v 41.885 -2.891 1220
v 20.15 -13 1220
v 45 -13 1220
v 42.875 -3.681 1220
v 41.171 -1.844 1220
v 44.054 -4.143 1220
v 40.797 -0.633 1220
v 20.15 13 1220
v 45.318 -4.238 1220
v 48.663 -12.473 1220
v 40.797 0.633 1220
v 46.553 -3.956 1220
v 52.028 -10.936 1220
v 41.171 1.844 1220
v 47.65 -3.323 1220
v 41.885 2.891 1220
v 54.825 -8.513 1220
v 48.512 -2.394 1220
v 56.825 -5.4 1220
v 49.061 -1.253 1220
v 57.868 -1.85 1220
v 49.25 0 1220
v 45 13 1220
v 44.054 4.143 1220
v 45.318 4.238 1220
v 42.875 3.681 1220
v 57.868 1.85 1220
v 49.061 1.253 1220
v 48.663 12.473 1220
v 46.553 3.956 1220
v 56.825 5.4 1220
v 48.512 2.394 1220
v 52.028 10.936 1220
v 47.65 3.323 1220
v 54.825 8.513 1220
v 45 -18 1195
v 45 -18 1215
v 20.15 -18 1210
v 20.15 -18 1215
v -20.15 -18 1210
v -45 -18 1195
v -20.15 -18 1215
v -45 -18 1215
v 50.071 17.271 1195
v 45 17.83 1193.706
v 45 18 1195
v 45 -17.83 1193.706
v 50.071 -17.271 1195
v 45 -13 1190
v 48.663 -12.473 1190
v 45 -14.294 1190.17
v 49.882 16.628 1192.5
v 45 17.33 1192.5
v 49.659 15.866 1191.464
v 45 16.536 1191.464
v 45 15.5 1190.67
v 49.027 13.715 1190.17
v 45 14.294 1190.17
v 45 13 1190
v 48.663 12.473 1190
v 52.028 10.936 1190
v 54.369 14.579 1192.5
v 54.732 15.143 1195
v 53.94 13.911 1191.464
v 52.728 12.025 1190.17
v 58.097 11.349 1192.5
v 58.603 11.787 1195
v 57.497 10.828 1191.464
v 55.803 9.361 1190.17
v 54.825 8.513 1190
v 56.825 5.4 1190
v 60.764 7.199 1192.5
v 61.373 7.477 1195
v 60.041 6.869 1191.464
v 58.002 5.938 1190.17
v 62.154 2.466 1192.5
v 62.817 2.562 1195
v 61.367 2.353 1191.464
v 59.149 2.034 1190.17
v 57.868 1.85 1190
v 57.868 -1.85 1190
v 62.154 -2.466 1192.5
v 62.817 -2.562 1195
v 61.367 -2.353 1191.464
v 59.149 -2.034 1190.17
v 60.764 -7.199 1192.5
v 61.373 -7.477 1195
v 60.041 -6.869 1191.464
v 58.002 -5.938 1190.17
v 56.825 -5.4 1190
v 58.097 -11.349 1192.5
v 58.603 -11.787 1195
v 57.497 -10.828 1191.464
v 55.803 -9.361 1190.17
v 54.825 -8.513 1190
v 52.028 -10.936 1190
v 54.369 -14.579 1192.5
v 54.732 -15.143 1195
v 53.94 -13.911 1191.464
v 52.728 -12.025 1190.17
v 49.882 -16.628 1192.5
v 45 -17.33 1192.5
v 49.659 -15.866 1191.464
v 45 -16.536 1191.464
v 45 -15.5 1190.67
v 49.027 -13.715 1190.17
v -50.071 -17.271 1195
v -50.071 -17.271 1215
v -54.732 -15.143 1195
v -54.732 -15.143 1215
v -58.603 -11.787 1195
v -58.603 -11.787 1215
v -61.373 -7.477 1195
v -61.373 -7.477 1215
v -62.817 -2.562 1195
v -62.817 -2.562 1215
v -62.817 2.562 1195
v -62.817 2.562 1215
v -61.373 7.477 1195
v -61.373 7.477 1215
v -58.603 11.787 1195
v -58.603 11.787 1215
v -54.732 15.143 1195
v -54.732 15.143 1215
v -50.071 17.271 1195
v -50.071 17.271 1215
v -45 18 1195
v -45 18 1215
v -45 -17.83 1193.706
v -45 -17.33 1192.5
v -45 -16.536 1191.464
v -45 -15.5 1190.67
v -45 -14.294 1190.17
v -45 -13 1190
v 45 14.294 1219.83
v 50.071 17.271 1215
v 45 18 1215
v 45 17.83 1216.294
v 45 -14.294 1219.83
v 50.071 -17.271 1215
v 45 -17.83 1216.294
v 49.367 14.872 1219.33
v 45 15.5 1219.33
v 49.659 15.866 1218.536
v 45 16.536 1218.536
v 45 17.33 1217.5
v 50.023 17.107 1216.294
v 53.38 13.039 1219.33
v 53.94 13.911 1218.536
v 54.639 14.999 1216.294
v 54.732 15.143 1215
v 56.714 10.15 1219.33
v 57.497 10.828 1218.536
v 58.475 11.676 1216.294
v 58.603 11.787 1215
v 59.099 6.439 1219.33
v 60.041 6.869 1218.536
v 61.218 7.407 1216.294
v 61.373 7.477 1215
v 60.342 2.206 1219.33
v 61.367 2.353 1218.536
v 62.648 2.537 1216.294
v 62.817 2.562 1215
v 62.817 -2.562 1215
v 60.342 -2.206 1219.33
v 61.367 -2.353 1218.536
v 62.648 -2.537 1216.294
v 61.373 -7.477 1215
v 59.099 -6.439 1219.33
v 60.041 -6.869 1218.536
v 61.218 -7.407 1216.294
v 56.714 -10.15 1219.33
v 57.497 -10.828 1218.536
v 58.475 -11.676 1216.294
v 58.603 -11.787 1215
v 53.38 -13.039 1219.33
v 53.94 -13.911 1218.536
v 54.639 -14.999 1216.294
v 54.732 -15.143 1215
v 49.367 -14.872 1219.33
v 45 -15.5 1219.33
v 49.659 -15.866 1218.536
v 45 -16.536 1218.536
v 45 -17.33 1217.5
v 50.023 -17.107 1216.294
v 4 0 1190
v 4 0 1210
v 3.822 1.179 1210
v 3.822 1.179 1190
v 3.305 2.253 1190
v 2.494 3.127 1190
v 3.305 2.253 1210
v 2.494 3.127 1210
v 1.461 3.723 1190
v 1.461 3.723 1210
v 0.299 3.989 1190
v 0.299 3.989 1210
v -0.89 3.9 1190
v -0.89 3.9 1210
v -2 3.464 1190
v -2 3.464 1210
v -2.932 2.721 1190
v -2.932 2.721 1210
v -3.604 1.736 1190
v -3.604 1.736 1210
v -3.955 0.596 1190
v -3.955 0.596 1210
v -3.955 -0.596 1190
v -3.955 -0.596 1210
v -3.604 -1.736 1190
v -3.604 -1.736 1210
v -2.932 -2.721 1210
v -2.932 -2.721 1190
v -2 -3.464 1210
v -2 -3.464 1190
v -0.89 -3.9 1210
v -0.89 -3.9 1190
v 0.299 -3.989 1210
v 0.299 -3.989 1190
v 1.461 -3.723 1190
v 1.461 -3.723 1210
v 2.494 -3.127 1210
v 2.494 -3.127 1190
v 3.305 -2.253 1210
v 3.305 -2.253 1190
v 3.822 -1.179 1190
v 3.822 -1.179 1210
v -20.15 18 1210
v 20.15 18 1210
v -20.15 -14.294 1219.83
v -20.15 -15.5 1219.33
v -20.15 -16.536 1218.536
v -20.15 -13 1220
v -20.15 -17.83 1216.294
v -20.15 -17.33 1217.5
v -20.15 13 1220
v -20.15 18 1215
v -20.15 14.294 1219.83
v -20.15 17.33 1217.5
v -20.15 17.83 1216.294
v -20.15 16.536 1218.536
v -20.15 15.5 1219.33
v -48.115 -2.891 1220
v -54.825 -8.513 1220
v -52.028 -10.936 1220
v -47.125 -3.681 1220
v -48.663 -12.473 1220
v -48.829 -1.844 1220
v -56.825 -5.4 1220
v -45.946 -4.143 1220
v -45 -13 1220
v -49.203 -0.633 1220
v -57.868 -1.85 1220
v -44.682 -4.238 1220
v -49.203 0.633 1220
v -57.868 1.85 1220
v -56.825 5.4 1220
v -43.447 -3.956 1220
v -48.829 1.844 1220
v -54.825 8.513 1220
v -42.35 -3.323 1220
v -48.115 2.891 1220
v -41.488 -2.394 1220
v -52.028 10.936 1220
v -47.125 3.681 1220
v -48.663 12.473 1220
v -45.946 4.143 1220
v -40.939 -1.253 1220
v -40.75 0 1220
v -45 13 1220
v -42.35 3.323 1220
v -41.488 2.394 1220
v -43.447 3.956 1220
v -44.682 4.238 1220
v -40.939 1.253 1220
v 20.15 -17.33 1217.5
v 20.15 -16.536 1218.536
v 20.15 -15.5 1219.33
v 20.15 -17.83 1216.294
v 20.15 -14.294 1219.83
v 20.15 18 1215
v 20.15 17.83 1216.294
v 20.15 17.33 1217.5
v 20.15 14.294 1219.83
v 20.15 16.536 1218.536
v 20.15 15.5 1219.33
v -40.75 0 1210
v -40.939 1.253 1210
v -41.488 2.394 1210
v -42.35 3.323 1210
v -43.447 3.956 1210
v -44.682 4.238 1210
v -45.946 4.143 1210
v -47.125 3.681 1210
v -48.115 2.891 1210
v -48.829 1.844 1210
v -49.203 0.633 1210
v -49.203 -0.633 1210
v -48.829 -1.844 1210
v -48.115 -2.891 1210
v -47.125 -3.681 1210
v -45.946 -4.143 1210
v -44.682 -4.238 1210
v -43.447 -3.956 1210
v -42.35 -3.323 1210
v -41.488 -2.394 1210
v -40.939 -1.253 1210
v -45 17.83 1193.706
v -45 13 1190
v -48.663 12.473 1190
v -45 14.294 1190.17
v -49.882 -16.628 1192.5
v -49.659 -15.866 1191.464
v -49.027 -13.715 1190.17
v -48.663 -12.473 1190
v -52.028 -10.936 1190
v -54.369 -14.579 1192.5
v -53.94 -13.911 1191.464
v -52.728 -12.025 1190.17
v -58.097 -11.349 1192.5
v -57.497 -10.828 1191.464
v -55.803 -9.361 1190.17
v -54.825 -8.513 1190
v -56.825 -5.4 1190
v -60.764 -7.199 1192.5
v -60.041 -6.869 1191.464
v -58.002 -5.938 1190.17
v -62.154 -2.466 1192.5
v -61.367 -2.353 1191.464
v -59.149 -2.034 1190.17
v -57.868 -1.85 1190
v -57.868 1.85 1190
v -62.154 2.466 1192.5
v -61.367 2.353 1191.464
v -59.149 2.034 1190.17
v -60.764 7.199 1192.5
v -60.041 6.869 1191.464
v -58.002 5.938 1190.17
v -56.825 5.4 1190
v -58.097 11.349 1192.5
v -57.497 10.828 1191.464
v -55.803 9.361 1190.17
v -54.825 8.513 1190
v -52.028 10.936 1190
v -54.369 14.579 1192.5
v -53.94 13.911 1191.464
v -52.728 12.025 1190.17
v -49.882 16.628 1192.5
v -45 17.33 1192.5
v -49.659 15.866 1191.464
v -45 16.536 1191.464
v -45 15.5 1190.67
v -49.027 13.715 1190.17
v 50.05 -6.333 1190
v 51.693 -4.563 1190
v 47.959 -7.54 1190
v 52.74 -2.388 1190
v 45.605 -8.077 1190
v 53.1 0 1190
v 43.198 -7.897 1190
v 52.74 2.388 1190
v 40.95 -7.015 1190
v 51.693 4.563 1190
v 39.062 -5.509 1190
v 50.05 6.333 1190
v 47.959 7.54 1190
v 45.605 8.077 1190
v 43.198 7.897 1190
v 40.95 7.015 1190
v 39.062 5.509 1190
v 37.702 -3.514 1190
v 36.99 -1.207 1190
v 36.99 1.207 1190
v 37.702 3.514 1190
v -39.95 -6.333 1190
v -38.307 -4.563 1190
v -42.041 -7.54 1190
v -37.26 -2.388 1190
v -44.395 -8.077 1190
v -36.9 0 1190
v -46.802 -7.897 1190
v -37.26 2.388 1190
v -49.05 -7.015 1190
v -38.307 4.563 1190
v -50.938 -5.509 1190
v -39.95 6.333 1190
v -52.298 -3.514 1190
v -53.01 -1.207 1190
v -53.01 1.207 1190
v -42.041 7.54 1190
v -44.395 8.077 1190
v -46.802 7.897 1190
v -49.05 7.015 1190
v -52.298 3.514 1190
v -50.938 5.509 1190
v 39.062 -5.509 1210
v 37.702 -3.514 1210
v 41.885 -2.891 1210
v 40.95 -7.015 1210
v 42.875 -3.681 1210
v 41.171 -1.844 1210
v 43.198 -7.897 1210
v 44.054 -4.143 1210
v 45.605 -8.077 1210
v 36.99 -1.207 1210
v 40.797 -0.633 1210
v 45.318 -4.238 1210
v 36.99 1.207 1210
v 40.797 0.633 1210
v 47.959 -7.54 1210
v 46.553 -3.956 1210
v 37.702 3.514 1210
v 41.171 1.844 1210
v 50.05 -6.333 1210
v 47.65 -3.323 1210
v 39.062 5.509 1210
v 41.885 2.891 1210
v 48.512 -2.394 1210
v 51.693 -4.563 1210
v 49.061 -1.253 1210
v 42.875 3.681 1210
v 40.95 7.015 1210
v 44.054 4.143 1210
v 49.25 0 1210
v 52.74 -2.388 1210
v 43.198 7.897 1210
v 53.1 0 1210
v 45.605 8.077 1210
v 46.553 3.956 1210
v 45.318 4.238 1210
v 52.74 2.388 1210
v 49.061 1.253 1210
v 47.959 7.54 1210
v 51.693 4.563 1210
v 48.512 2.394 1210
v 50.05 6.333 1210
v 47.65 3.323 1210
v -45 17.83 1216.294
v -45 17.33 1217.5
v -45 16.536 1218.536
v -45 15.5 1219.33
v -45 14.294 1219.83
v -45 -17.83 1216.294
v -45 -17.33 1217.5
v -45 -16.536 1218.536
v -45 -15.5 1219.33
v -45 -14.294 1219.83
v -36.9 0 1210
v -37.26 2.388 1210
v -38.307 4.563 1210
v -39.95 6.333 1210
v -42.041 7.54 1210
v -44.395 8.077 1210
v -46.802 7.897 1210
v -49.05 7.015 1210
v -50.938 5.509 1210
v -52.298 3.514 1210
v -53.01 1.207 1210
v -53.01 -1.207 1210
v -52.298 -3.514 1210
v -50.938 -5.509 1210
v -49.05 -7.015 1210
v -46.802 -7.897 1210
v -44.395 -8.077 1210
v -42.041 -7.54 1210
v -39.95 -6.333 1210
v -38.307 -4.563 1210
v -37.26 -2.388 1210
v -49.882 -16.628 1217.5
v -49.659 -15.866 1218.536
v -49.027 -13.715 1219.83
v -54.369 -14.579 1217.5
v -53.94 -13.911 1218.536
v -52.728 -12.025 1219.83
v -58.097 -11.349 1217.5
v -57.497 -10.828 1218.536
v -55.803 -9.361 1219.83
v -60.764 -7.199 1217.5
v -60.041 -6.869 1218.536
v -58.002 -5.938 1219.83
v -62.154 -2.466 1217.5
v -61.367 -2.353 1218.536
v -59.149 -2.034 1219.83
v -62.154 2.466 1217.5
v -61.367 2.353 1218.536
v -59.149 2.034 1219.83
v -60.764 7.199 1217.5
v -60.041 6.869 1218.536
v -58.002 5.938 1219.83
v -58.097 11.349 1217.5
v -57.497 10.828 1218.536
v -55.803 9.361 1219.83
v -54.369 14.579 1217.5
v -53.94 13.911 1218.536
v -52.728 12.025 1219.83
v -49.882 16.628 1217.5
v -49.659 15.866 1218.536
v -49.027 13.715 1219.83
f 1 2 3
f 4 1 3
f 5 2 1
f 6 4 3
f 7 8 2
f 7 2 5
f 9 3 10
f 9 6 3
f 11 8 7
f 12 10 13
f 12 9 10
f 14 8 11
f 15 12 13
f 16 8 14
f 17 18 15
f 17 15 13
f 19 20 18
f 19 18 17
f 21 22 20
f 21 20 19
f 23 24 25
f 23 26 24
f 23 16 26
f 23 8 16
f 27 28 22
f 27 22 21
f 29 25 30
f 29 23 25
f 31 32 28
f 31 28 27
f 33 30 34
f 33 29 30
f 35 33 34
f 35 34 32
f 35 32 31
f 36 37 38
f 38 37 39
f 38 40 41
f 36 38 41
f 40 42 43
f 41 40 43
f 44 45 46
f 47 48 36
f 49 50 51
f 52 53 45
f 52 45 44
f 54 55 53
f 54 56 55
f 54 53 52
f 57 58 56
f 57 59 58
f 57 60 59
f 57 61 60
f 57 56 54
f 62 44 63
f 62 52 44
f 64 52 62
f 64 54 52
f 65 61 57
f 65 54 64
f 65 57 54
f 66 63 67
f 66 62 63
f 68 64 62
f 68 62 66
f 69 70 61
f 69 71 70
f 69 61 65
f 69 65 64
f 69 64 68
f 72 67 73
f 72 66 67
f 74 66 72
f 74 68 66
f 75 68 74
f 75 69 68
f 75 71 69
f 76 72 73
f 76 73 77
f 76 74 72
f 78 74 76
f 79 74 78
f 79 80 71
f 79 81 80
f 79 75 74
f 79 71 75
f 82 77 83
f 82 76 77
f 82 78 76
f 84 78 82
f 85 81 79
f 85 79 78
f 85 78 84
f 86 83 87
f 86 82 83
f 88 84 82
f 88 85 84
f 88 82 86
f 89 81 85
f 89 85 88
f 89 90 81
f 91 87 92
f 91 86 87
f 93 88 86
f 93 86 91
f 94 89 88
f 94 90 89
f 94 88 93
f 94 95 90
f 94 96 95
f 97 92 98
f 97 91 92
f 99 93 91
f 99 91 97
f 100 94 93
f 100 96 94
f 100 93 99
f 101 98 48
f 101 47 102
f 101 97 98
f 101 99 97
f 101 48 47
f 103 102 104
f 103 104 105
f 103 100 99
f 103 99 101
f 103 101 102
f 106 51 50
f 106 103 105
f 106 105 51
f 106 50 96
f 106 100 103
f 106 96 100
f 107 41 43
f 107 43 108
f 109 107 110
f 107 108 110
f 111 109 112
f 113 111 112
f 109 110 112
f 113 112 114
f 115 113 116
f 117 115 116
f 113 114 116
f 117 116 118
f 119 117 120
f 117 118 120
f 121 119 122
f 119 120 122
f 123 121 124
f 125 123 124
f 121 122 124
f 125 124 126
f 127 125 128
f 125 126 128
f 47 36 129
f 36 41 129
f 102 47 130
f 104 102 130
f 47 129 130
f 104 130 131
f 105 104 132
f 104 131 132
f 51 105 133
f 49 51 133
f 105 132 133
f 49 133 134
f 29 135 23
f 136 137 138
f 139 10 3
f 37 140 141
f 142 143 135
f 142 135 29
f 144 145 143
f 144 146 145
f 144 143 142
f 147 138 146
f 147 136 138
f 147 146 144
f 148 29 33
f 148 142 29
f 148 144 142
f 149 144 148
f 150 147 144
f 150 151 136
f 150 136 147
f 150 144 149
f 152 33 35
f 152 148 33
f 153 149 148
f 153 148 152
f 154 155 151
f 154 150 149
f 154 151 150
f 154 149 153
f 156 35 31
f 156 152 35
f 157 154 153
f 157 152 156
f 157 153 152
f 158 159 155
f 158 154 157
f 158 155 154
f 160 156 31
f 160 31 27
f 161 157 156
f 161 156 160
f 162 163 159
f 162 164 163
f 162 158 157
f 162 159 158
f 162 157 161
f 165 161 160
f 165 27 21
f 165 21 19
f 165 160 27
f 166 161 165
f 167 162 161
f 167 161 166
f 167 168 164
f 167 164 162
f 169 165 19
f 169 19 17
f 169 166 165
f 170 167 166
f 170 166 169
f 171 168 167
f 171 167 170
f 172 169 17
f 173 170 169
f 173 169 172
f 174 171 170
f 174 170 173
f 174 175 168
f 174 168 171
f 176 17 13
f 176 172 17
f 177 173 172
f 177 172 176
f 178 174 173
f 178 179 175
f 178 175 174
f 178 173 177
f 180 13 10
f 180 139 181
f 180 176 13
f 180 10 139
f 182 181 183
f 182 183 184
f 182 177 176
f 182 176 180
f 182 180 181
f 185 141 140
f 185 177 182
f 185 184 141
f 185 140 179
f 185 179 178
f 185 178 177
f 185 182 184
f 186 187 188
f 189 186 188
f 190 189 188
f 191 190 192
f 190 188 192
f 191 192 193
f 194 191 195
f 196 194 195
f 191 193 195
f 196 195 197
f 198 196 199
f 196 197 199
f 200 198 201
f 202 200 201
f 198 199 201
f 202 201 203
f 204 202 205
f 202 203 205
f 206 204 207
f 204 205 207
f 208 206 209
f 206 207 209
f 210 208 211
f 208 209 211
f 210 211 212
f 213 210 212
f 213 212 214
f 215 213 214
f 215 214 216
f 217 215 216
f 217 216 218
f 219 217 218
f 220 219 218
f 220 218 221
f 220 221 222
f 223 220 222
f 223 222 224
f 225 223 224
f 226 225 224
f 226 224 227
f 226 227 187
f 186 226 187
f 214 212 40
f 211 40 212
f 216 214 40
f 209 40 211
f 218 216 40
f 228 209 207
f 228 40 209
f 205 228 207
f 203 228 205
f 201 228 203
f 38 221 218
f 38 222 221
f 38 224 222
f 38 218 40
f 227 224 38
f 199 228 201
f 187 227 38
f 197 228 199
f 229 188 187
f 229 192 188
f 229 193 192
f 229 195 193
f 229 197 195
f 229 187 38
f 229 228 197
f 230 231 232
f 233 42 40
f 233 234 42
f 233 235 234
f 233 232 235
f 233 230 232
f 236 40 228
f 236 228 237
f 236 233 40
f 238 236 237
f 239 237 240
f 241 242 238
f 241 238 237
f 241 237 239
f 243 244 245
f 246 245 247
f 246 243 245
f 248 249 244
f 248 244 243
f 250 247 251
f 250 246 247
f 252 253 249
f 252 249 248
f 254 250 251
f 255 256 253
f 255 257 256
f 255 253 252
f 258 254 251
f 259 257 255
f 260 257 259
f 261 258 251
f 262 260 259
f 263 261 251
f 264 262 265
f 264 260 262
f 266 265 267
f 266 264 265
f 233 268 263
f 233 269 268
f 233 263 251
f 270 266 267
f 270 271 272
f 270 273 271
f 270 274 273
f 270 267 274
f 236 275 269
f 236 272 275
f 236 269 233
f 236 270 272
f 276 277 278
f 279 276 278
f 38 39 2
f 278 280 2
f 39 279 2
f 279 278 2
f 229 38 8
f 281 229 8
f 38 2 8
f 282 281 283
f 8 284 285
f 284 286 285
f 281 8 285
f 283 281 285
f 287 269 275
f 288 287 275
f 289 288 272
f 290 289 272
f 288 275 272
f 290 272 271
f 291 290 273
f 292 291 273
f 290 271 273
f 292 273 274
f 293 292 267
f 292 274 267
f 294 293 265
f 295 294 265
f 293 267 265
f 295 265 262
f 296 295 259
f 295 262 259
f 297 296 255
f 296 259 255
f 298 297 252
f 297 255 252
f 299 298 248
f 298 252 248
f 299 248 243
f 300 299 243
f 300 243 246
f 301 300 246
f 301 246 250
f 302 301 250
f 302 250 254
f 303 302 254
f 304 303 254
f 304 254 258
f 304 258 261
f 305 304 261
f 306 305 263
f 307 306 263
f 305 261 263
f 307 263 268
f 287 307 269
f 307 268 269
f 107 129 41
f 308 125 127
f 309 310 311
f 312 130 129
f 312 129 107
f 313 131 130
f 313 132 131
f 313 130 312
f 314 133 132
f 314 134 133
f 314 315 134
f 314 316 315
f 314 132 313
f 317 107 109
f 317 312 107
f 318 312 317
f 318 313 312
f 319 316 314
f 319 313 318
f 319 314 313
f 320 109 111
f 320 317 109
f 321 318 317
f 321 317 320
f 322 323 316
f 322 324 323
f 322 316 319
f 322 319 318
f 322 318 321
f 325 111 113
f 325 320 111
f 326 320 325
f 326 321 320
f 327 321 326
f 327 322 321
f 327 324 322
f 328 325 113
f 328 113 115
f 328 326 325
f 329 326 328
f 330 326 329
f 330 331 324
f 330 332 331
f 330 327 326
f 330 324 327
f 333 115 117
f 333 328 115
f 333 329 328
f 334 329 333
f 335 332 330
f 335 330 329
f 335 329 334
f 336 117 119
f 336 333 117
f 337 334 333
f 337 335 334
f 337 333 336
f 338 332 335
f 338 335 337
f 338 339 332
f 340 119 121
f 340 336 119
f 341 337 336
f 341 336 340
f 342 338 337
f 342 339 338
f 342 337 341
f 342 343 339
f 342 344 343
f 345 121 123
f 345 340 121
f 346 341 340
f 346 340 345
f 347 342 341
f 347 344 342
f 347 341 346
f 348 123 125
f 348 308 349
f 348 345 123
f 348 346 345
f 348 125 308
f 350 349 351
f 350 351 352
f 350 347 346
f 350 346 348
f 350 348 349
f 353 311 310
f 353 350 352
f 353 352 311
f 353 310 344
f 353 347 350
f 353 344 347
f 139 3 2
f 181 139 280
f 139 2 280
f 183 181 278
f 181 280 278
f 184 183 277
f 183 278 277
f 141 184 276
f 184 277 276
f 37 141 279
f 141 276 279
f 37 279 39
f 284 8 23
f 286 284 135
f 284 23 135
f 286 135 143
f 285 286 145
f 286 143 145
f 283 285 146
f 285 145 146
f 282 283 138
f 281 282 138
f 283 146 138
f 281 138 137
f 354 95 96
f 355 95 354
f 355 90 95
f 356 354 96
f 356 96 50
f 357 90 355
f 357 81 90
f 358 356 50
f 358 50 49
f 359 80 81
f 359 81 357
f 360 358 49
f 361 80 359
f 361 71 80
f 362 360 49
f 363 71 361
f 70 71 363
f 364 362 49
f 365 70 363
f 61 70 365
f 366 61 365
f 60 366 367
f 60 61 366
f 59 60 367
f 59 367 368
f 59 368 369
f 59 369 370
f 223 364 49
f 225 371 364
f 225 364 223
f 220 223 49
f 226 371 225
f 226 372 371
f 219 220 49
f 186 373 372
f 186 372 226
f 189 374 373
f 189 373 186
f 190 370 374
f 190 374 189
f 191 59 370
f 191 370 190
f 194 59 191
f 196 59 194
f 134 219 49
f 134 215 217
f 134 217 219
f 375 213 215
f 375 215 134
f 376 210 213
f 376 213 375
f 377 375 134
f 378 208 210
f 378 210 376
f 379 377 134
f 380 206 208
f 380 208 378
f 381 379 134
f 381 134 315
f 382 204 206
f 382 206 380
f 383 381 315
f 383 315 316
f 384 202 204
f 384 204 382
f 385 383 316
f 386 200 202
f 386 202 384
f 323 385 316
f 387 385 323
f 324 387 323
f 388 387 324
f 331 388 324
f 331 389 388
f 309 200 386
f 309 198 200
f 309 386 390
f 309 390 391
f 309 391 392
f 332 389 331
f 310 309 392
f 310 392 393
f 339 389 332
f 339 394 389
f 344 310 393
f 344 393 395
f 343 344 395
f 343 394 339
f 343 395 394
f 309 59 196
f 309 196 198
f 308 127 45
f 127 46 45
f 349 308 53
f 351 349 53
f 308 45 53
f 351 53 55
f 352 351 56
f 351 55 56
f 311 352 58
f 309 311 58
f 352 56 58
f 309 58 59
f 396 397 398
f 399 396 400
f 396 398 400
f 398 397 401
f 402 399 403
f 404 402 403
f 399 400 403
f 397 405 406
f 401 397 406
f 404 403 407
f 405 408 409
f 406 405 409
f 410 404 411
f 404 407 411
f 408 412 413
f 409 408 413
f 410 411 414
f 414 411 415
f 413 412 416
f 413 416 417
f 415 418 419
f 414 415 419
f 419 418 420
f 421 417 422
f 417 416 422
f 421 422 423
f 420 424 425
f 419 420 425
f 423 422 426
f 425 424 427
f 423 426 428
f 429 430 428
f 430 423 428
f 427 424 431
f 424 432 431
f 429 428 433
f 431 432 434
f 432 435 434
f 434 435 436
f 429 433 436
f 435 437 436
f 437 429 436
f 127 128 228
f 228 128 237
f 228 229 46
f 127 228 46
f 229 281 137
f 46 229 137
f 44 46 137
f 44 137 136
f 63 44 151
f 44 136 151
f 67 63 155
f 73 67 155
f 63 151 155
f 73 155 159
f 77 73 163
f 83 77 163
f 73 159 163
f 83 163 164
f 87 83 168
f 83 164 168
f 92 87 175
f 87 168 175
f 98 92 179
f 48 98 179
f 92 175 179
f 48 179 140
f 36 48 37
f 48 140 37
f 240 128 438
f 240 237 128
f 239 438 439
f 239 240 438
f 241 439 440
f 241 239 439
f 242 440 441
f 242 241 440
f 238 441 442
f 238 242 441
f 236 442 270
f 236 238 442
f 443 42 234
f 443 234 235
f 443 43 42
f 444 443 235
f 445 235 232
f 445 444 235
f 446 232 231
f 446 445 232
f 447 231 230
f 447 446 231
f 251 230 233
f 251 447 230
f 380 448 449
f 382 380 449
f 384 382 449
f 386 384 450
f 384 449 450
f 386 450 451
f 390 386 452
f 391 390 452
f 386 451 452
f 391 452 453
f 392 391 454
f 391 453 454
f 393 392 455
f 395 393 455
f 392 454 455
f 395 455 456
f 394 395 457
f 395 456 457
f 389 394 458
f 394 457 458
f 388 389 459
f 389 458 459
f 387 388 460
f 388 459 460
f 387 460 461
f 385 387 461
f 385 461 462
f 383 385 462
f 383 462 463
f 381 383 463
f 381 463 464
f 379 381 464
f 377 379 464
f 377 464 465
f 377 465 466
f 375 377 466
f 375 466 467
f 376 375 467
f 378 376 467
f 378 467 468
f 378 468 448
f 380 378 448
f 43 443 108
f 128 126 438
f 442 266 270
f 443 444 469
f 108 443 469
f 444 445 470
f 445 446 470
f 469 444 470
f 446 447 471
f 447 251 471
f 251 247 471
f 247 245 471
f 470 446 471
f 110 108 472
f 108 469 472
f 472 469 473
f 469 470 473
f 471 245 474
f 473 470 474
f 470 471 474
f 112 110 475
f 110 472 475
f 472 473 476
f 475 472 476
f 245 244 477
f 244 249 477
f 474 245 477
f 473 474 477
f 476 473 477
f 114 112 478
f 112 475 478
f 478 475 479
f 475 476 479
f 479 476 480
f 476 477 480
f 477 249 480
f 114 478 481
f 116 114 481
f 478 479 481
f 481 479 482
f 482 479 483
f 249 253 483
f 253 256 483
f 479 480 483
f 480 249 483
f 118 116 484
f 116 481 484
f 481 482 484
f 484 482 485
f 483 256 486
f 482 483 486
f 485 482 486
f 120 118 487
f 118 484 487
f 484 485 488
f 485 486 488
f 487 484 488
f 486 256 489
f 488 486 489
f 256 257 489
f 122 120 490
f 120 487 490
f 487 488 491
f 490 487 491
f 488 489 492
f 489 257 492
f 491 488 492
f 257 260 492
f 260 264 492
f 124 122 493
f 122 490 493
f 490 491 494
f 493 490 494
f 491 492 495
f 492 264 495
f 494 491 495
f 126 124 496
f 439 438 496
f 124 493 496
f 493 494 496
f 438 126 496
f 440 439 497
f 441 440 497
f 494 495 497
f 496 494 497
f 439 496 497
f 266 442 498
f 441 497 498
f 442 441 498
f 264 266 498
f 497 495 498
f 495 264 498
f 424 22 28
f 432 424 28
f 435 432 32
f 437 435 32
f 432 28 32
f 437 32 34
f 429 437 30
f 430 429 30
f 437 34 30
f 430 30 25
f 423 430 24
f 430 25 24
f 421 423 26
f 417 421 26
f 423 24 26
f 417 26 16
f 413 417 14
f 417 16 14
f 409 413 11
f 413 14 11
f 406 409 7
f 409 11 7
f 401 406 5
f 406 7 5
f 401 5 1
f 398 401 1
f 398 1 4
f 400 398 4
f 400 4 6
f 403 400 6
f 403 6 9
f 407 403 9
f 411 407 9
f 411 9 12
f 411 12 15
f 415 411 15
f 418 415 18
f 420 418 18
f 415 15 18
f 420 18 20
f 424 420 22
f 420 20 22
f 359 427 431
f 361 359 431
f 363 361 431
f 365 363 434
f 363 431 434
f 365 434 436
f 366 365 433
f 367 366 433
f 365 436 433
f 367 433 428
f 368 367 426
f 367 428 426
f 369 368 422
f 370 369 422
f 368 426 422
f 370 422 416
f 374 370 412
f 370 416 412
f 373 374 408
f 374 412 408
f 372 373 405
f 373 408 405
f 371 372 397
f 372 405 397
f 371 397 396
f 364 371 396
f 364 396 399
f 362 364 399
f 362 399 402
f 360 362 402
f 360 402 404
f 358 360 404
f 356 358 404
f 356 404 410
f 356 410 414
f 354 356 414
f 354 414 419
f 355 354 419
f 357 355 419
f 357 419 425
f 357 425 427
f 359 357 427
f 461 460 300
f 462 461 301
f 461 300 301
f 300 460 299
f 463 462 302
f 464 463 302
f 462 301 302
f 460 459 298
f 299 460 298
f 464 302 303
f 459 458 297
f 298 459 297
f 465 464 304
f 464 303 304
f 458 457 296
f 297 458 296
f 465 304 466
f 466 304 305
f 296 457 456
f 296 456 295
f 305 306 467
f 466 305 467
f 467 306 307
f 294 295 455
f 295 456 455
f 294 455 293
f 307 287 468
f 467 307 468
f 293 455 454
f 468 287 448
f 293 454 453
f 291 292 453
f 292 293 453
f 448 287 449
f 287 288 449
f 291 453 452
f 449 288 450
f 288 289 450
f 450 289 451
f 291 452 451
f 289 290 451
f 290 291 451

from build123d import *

# Parameters (mm, degrees)
BOSS_EXTRUDE1_START = 1220
SKETCH1_R           = 8.1
BOSS_EXTRUDE1_DEPTH = 30
SKETCH3_R           = 8.1
SKETCH3_R_2         = 4.25
BOSS_EXTRUDE2_DEPTH = 10
SKETCH4_W           = 40.3
SKETCH4_H           = 36
CUT_EXTRUDE1_DEPTH  = 10
FILLET1_R           = 5
FILLET2_R           = 5
SKETCH5_R           = 4
CUT_EXTRUDE2_DEPTH  = 50


with BuildPart() as part:
    # Sketch1 → Boss-Extrude1 (new body)
    with BuildSketch(Plane.XY.offset(BOSS_EXTRUDE1_START)):
        with BuildLine():
            Line((-45, 18), (45, 18))
            ThreePointArc((45, 18), (63, 0), (45, -18))
            Line((45, -18), (-45, -18))
            ThreePointArc((-45, -18), (-63, 0), (-45, 18))
        make_face()
        with Locations((-45, 0)):
            Circle(SKETCH1_R, mode=Mode.SUBTRACT)
        with Locations((45, 0)):
            Circle(SKETCH1_R, mode=Mode.SUBTRACT)
    extrude(amount=-BOSS_EXTRUDE1_DEPTH)

    # Sketch3 → Boss-Extrude2 (add)
    # profile 1 of 2: a face of its own
    with BuildSketch(Plane.XY.offset(1220)):
        with Locations((45, 0)):
            Circle(SKETCH3_R)
        with Locations((45, 0)):
            Circle(SKETCH3_R_2, mode=Mode.SUBTRACT)
    # profile 2 of 2: a face of its own
    with BuildSketch(Plane.XY.offset(1220)):
        with Locations((-45, 0)):
            Circle(SKETCH3_R)
        with Locations((-45, 0)):
            Circle(SKETCH3_R_2, mode=Mode.SUBTRACT)
    extrude(amount=-BOSS_EXTRUDE2_DEPTH)

    # Sketch4 → Cut-Extrude1 (cut)
    with BuildSketch(Plane.XY.offset(1220)):
        Rectangle(SKETCH4_W, SKETCH4_H)
    extrude(amount=-CUT_EXTRUDE1_DEPTH, mode=Mode.SUBTRACT)

    # Fillet1
    fillet1_edges = [part.edges().sort_by_distance(p)[0] for p in [
        (63, 0, 1190),
        (0, 18, 1190),
        (-63, 0, 1190),
        (0, -18, 1190),
    ]]
    fillet(fillet1_edges, radius=FILLET1_R)

    # Fillet2
    fillet2_edges = [part.edges().sort_by_distance(p)[0] for p in [
        (32.575, -18, 1220),
        (-32.575, 18, 1220),
        (32.575, 18, 1220),
        (63, 0, 1220),
        (-32.575, -18, 1220),
        (-63, 0, 1220),
    ]]
    fillet(fillet2_edges, radius=FILLET2_R)

    # Sketch5 → Cut-Extrude2 (cut)
    with BuildSketch(Plane.XY.offset(1210)):
        Circle(SKETCH5_R)
    extrude(amount=-CUT_EXTRUDE2_DEPTH, mode=Mode.SUBTRACT)


solid = part.part
